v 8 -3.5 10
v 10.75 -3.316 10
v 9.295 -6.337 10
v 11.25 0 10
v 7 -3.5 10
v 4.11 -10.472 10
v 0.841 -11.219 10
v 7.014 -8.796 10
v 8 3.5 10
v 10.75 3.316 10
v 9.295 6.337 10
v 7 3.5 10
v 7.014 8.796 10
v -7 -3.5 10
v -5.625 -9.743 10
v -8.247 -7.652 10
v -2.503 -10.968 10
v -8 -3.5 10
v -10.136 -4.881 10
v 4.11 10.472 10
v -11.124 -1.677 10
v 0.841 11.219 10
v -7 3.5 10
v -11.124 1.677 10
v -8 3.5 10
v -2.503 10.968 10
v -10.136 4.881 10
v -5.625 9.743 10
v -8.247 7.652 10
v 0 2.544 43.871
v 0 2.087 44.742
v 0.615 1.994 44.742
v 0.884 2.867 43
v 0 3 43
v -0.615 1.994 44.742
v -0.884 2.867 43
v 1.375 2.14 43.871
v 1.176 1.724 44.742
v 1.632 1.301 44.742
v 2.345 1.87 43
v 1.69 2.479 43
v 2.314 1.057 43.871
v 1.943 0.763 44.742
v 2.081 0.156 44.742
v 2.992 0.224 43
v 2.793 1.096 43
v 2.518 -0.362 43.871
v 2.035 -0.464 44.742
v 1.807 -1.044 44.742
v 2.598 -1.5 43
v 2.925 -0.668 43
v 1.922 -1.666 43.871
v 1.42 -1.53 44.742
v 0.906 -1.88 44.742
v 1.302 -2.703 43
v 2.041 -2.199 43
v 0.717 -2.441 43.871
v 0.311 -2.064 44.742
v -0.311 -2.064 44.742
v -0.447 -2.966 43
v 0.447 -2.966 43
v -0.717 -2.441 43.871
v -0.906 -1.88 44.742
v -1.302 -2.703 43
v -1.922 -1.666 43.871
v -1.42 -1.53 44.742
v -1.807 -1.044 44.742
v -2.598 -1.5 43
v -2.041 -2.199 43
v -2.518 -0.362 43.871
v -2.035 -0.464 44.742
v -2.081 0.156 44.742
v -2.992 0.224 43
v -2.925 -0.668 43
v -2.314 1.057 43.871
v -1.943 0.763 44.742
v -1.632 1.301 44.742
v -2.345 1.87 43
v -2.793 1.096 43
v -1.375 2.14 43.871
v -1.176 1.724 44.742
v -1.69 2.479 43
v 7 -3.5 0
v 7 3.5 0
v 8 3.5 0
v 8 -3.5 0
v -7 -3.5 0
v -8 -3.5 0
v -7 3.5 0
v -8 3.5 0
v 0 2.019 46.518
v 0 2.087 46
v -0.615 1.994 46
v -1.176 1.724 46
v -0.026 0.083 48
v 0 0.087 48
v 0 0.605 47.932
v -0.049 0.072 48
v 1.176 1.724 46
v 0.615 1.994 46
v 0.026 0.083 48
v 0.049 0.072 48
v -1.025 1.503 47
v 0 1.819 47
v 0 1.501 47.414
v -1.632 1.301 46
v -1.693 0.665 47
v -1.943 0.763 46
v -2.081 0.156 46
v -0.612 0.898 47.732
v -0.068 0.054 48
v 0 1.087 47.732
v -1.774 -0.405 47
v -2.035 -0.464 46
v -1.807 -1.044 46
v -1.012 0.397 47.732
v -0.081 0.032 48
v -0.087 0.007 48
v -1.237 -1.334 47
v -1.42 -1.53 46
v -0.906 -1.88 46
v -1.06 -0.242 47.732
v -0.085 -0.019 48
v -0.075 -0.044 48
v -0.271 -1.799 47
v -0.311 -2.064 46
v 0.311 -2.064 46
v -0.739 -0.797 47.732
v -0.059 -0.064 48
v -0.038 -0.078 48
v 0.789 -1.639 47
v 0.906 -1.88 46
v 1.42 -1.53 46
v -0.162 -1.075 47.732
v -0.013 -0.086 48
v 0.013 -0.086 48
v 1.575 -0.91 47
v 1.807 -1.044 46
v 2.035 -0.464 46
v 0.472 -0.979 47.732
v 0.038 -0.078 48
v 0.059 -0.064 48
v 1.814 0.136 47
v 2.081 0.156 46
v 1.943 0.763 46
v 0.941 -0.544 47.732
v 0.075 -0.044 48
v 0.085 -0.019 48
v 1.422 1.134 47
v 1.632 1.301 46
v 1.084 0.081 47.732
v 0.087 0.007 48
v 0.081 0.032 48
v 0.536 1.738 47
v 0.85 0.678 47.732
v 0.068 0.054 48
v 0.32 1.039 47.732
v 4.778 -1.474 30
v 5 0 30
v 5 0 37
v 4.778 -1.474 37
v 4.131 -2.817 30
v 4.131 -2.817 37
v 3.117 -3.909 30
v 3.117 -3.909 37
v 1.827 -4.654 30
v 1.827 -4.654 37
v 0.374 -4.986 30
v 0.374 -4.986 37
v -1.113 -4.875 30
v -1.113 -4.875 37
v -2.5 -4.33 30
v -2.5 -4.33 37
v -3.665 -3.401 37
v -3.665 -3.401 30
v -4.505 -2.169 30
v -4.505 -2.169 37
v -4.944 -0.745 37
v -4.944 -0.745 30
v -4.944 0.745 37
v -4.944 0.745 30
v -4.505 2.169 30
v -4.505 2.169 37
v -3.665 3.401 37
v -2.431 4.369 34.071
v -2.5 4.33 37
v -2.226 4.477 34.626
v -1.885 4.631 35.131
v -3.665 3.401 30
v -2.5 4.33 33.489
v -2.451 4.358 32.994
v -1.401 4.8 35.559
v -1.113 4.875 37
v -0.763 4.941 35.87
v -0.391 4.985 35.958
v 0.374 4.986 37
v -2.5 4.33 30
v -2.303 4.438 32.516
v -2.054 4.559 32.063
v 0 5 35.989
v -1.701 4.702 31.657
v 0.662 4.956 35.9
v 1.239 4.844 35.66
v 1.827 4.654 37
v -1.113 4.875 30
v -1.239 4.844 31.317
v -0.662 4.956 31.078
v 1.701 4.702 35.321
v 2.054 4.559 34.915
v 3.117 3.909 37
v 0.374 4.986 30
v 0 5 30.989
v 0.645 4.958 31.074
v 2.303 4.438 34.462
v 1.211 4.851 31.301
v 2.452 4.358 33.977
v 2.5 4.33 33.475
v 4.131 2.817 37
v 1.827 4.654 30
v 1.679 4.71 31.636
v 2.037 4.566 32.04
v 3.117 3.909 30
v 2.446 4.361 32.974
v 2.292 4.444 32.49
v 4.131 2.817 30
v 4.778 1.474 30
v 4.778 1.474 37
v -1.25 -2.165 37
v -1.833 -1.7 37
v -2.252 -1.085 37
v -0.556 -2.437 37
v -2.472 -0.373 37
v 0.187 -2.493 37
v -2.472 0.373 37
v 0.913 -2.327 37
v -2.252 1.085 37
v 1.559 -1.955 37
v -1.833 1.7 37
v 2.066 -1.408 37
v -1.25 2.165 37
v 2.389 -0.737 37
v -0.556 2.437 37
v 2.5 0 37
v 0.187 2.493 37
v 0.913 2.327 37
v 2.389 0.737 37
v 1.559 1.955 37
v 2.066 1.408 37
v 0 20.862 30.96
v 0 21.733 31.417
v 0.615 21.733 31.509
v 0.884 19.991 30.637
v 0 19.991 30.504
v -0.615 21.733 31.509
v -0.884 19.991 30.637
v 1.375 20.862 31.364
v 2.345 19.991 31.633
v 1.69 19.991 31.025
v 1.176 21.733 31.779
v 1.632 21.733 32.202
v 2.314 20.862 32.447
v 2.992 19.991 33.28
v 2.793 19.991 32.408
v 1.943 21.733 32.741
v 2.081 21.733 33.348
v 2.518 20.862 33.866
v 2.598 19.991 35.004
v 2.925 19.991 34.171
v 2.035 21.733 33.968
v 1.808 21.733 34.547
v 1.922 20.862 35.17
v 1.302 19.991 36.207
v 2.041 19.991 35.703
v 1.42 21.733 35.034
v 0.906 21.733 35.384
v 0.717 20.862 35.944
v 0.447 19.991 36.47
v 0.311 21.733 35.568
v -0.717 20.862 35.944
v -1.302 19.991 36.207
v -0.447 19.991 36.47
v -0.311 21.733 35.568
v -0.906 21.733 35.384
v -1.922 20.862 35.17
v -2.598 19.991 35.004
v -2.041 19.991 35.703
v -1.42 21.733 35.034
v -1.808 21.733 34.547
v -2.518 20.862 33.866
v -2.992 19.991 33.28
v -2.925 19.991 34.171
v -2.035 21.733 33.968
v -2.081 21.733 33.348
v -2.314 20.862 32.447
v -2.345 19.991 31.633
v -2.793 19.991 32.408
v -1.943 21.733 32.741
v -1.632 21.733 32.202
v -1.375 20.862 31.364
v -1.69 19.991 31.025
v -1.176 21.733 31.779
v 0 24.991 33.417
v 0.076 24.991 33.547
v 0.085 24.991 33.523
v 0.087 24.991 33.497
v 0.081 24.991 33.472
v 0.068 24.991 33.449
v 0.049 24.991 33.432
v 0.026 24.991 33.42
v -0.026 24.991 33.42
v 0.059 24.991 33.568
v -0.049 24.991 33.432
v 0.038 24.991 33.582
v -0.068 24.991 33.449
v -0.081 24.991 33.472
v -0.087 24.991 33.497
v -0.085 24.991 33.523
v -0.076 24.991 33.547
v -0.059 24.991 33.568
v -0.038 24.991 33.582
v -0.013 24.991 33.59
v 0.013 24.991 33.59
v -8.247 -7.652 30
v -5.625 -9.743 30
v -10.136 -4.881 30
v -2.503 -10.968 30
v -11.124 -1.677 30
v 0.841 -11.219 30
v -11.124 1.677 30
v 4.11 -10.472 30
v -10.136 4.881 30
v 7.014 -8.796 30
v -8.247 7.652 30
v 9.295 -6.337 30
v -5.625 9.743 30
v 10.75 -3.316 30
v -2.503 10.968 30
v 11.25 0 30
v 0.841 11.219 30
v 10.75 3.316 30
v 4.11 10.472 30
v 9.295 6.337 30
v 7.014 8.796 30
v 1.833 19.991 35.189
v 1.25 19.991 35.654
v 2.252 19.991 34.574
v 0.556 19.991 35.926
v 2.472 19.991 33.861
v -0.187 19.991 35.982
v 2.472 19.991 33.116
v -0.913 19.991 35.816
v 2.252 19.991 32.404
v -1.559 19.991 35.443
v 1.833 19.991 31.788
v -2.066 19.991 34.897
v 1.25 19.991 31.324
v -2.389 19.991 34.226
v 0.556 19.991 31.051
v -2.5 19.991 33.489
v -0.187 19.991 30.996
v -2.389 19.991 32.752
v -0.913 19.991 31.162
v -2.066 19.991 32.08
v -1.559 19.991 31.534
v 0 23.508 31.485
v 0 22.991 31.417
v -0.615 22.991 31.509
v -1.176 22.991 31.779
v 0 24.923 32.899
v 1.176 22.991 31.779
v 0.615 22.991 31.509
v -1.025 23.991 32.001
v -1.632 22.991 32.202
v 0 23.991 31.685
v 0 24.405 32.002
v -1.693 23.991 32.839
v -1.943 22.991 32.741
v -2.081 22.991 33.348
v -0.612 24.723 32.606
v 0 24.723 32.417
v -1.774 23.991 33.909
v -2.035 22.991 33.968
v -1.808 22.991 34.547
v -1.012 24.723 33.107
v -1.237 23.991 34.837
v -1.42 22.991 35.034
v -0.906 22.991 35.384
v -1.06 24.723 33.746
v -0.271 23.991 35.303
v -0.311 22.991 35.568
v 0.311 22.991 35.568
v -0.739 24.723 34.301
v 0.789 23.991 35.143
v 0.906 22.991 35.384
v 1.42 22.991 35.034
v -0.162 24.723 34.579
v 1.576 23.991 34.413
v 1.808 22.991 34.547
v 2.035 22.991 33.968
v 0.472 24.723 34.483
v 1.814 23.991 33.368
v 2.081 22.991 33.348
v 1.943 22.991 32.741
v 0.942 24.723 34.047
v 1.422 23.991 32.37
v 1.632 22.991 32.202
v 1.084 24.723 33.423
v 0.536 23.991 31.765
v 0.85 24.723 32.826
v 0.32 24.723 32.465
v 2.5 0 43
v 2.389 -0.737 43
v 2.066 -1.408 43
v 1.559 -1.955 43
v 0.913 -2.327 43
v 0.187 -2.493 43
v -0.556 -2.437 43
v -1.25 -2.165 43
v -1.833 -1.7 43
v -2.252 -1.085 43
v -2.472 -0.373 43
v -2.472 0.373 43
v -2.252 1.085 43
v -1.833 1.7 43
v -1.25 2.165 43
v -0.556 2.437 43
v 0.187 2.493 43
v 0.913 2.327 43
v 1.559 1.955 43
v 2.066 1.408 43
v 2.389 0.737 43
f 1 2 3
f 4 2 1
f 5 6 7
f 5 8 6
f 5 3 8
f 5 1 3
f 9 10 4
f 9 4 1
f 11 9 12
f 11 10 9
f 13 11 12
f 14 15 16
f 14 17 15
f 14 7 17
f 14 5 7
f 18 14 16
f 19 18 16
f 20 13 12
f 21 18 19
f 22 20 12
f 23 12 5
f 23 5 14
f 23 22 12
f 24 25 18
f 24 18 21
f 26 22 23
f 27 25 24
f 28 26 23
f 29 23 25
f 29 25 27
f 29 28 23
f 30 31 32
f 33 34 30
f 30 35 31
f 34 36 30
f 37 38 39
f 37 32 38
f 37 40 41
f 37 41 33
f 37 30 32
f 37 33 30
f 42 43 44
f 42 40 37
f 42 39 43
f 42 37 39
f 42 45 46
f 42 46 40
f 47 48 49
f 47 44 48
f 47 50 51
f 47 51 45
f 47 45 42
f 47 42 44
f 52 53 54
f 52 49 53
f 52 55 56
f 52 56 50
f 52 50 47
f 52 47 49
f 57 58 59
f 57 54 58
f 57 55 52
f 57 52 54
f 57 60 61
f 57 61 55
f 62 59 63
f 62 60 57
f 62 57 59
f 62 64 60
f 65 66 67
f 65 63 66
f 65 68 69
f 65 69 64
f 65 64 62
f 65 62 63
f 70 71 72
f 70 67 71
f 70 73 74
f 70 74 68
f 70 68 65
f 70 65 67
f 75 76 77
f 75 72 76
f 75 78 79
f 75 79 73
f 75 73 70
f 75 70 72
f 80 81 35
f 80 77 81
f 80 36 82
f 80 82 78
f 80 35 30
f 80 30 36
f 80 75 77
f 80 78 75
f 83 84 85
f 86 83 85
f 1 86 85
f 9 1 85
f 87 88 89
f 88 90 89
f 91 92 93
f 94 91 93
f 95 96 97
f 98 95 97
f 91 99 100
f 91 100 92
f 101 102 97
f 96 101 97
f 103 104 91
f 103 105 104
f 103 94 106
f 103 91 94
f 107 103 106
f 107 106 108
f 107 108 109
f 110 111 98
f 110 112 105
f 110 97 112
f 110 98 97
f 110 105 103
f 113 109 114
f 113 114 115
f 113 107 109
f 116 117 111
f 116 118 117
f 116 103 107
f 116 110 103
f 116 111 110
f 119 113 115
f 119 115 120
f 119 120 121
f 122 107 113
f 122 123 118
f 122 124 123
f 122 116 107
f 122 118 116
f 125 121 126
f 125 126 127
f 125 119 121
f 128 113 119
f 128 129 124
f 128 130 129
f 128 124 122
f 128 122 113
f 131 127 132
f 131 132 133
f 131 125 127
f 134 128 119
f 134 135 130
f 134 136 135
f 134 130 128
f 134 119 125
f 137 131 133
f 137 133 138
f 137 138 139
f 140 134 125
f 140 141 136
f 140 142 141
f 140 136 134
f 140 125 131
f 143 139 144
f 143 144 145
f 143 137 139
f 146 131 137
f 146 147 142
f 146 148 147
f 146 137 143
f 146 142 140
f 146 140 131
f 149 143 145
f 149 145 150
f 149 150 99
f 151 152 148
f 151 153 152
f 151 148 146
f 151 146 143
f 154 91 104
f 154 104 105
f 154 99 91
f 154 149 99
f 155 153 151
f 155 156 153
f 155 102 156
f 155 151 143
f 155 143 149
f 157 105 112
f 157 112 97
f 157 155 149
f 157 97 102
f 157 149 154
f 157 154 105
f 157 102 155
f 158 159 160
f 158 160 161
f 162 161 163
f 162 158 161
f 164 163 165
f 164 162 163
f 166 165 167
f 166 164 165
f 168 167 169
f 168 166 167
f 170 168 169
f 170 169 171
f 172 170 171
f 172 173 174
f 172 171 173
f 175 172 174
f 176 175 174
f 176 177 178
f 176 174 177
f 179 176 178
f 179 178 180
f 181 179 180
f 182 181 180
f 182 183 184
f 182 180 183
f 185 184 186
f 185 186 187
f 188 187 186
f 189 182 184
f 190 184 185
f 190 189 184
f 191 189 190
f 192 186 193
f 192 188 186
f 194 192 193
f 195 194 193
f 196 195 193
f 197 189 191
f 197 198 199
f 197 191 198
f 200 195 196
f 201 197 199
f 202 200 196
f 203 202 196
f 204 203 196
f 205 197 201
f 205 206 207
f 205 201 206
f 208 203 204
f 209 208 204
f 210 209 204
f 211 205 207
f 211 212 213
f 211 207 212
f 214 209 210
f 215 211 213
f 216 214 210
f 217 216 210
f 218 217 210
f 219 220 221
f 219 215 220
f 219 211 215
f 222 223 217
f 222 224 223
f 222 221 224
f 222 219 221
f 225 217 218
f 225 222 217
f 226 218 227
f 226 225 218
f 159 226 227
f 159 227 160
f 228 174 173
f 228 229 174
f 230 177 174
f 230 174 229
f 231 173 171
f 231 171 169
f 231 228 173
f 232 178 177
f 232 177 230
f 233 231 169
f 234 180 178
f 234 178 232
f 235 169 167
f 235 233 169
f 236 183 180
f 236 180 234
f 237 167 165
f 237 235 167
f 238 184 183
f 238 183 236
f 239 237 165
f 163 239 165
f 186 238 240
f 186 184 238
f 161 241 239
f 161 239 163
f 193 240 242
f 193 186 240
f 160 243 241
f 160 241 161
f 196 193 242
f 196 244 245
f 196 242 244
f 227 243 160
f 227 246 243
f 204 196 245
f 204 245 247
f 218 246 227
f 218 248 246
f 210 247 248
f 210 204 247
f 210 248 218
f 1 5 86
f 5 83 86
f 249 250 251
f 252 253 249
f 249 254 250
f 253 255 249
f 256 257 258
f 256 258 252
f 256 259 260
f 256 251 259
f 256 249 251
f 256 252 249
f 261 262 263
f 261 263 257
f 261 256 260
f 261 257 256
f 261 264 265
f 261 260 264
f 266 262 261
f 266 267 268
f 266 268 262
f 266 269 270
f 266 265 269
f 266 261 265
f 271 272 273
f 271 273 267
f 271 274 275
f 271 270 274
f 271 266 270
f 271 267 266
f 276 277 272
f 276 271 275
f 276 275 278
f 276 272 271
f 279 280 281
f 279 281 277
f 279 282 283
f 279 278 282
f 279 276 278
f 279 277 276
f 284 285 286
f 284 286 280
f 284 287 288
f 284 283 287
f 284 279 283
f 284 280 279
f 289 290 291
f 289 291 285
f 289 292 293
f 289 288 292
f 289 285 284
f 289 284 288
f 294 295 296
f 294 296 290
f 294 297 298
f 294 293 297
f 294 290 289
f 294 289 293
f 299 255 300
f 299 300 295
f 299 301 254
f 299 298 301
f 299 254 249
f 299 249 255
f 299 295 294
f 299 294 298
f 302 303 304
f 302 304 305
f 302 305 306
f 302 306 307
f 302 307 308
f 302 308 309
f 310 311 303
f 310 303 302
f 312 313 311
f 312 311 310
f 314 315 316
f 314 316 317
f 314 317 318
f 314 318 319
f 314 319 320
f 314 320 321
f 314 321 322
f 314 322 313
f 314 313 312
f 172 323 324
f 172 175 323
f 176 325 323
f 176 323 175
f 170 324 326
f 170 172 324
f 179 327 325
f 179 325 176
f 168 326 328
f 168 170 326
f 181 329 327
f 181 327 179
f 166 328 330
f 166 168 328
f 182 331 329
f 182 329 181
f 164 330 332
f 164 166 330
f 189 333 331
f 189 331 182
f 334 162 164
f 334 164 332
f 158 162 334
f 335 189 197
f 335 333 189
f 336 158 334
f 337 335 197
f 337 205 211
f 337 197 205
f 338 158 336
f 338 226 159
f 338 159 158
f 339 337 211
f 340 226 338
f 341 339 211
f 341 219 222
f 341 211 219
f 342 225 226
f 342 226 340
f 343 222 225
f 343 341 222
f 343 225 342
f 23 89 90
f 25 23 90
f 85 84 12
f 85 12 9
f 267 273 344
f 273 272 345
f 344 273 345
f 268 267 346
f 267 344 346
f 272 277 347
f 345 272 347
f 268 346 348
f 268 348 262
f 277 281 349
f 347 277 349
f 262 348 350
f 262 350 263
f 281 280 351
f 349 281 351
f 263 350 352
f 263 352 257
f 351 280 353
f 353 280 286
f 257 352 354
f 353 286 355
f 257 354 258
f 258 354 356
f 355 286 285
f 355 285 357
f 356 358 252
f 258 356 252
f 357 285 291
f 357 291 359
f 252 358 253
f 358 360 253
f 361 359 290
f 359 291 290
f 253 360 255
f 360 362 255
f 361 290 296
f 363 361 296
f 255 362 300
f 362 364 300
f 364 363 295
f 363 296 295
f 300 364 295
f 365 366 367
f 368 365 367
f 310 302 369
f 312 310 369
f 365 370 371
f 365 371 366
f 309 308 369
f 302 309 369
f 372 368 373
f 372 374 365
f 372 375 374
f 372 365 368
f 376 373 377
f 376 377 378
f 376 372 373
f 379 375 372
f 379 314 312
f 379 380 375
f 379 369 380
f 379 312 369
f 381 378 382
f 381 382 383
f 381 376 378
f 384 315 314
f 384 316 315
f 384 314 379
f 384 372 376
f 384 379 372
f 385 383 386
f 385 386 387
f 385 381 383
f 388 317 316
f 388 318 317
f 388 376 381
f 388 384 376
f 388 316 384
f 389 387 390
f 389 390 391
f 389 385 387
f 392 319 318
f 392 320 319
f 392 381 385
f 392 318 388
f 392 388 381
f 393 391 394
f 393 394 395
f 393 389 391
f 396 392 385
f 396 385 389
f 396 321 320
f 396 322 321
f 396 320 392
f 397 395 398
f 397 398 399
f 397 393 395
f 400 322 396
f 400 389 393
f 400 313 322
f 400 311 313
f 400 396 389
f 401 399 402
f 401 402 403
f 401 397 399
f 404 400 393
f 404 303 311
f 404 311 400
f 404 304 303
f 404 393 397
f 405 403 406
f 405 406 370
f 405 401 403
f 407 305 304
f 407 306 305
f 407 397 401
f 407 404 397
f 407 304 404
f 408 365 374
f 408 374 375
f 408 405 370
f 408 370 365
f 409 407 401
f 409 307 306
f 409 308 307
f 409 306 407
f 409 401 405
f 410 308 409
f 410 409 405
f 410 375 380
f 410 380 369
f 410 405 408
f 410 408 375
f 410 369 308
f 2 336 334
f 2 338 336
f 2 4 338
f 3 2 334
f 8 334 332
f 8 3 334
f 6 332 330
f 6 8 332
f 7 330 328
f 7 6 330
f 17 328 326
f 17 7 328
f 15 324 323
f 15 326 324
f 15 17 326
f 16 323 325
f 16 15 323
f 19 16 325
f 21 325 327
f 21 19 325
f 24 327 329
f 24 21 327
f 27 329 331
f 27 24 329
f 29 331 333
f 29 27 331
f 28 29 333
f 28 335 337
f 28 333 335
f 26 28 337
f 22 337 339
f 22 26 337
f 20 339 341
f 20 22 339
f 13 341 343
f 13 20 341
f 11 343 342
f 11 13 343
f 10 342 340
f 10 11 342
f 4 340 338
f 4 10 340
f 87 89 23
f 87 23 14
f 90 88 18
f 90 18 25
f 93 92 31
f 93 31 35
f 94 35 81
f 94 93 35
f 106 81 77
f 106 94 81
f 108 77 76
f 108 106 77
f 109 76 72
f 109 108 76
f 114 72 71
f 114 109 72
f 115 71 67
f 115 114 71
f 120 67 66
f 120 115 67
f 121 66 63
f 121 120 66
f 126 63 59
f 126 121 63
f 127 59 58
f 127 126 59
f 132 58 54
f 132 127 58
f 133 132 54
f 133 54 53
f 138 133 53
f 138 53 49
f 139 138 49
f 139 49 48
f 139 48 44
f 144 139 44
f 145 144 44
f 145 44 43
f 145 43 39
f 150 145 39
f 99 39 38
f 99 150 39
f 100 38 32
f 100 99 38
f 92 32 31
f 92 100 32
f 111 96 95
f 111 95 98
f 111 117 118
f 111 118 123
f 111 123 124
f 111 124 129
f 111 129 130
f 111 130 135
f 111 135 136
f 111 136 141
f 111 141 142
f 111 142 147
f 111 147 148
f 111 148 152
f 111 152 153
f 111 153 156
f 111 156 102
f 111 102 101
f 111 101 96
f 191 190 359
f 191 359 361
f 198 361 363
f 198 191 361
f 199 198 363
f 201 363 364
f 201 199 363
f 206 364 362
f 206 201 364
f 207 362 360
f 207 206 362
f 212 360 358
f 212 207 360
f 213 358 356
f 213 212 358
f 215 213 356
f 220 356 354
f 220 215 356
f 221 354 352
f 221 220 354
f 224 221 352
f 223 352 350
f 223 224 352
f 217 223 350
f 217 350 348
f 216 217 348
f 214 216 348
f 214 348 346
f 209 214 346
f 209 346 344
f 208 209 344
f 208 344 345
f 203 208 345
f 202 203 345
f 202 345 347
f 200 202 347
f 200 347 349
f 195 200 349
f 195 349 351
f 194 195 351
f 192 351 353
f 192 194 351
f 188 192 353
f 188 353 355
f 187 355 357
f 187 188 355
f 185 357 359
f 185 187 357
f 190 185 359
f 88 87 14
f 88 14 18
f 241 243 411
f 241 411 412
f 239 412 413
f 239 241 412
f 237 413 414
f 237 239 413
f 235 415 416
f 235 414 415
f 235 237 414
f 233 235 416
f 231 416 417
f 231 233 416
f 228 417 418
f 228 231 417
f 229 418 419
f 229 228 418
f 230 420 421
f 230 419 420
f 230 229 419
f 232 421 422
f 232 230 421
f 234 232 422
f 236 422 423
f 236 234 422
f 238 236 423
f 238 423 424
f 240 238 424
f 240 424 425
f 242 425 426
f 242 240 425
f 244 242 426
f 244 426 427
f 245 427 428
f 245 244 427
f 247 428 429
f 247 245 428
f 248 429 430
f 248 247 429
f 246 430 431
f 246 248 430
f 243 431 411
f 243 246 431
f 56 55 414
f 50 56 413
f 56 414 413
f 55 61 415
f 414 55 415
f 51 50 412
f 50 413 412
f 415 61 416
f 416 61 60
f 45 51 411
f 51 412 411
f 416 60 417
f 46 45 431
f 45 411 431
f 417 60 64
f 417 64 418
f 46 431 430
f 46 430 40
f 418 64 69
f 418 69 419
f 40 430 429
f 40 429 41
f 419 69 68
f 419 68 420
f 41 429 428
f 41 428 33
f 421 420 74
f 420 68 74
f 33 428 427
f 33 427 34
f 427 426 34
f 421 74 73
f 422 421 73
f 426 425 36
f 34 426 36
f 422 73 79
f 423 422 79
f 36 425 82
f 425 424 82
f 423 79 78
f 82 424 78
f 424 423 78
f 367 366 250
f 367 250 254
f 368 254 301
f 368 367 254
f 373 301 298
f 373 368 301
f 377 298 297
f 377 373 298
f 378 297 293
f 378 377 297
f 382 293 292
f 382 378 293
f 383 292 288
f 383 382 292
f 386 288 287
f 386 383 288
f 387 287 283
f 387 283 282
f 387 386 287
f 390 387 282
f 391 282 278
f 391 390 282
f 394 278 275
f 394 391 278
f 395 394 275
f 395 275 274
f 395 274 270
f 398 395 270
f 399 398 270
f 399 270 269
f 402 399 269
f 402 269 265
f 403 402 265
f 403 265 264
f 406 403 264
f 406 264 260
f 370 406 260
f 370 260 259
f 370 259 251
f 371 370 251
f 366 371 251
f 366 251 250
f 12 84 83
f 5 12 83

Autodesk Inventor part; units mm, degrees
ref_plane "XY Plane" through (0, 0, 0) normal (0, 0, 1) x (1, 0, 0)
sketch "Block1" plane through (0, 0, 0) normal (0, 0, 1) x (1, 0, 0)
  line L0 (-0.685, 86) -> (2.315, 86)
  line L1 (-0.685, 86) -> (-0.685, 91)
  line L2 (2.315, 86) -> (1.4022, 87.742)
  line L3 (1.4022, 87.742) -> (1.4022, 89)
  line L4 (-0.5978, 91) -> (-0.685, 91)
  arc A0 (1.4022, 89) -> (-0.5978, 91) centre (-0.5978, 89) ccw
  point P0 (0.6511, 88.4856)
  dimension "d9" = 3
  dimension "d10" = 5
  dimension "d11" = 2
  dimension "d14" = 152.344
  dimension "d15" = 2.0871
sketch "Skizze1" plane through (0, 0, 0) normal (0, 0, 1) x (1, 0, 0)
  point P0 (0, 0)
sketch "Skizze2" plane through (0, 0, 0) normal (0, 0, 1) x (1, 0, 0)
  circle A0 centre (0, 0) radius 11.25
  dimension "d0" = 22.5
extrude "Extrusion1" add sketch "Skizze2" along normal blind 30
sketch "Skizze3" plane through (0, 0, 30) normal (0, 0, 1) x (1, 0, 0)
  circle A0 centre (0, 0) radius 11.25 projected
  circle A1 centre (0, 0) radius 5
  dimension "d3" = 10
extrude "Extrusion2" add sketch "Skizze3" along normal blind 7 contours A1
sketch "Skizze4" plane through (0, 0, 37) normal (0, 0, 1) x (1, 0, 0)
  circle A0 centre (0, 0) radius 5 projected
  circle A1 centre (0, 0) radius 2.5
  dimension "d6" = 5
extrude "Extrusion3" add sketch "Skizze4" along normal blind 6 contours A1
sketch "Skizze5" plane through (0, 0, 0) normal (1, 0, 0) x (0, 1, 0)
  line L0 (2.5, 43) -> (-2.5, 43) projected
  line L1 (-2.5, 43) -> (2.5, 43) construction
  line L2 (0, 43) -> (3, 43)
  line L3 (0, 43) -> (0, 48)
  line L4 (3, 43) -> (2.0871, 44.742)
  line L5 (2.0871, 44.742) -> (2.0871, 46)
  line L6 (0.0871, 48) -> (0, 48)
  arc A0 (2.0871, 46) -> (0.0871, 48) centre (0.0871, 46) ccw
  point P0 (0, 0)
sketch "Skizze6" plane through (0, 0, 0) normal (0, 0, -1) x (-1, 0, 0)
  circle A0 centre (0, 0) radius 11.25 projected
  line L0 (7, 3.5) -> (7, -3.5)
  line L1 (7, -3.5) -> (8, -3.5)
  line L2 (7, 3.5) -> (8, 3.5)
  line L3 (8, -3.5) -> (8, 3.5)
  line L4 (0, 11.25) -> (0, -11.25) construction
  line L5 (-7, 3.5) -> (-7, -3.5)
  line L6 (-7, -3.5) -> (-8, -3.5)
  line L7 (-7, 3.5) -> (-8, 3.5)
  line L8 (-8, -3.5) -> (-8, 3.5)
  dimension "d19" = 7
  dimension "d20" = 1
  dimension "d21" = 7
  dimension "d23" = 3.5
extrude "Extrusion4" cut sketch "Skizze6" against normal blind 10
revolve "Umdrehung2" add sketch "Skizze5" angle 360 about axis through (0, 0, 43) along (0, 0, 1)
ref_plane "Arbeitsebene2" through (0, 5, 30) normal (0, 1, 0) x (-1, 0, 0)
ref_plane "Arbeitsebene1" through (0, 5, 30) normal (0, 1, 0) x (-1, 0, 0)
sketch "Skizze7" plane through (0, 5, 30) normal (0, 1, 0) x (-1, 0, 0)
  circle A0 centre (0, 3.4888) radius 2.5
  point P0 (0, -30)
  dimension "d27" = 5
extrude "Extrusion5" add sketch "Skizze7" along normal blind 15 and the other way blind 3
sketch "Skizze9" plane through (0, 0, 0) normal (1, 0, 0) x (0, 1, 0)
  point P0 (0, 0)
sketch "Skizze10" plane through (0, 0, 0) normal (1, 0, 0) x (0, 1, 0)
  point P0 (0, 0)
ref_plane "Arbeitsebene6" through (0, 0, 0) normal (1, 0, 0) x (0, 1, 0)
ref_plane "Arbeitsebene7" through (0, 20, 33.4888) normal (0, 1, 0) x (1, 0, 0)
sketch "Skizze11" plane through (0, 0, 0) normal (1, 0, 0) x (0, 1, 0)
  point P0 (0, 0)
sketch "Skizze12" plane through (0, 0, 0) normal (1, 0, 0) x (0, 1, 0)
  line L0 (0, 0) -> (0, 41.8024) construction
sketch "Skizze13" plane through (0, 0, 0) normal (1, 0, 0) x (0, 1, 0)
  line L0 (0, 43) -> (3, 43)
  line L1 (0, 43) -> (0, 48)
  line L2 (3, 43) -> (2.0871, 44.742)
  line L3 (2.0871, 44.742) -> (2.0871, 46)
  line L4 (0.0871, 48) -> (0, 48)
  arc A0 (2.0871, 46) -> (0.0871, 48) centre (0.0871, 46) ccw
  line L5 (19.9907, 33.5038) -> (19.9907, 30.5038)
  line L6 (19.9907, 33.5038) -> (24.9907, 33.5038)
  line L7 (19.9907, 30.5038) -> (21.7326, 31.4166)
  line L8 (21.7326, 31.4166) -> (22.9907, 31.4166)
  line L9 (24.9907, 33.4166) -> (24.9907, 33.5038)
  arc A1 (22.9907, 31.4166) -> (24.9907, 33.4166) centre (22.9907, 33.4166) ccw
  point P0 (0, 0)
revolve "Umdrehung3" add sketch "Skizze13" angle 360 about axis through (0, 19.9907, 33.5038) along (0, 1, 0) contours L6 L9 A1 L8 L7 L5
properties part number "Ventil_CPY"
